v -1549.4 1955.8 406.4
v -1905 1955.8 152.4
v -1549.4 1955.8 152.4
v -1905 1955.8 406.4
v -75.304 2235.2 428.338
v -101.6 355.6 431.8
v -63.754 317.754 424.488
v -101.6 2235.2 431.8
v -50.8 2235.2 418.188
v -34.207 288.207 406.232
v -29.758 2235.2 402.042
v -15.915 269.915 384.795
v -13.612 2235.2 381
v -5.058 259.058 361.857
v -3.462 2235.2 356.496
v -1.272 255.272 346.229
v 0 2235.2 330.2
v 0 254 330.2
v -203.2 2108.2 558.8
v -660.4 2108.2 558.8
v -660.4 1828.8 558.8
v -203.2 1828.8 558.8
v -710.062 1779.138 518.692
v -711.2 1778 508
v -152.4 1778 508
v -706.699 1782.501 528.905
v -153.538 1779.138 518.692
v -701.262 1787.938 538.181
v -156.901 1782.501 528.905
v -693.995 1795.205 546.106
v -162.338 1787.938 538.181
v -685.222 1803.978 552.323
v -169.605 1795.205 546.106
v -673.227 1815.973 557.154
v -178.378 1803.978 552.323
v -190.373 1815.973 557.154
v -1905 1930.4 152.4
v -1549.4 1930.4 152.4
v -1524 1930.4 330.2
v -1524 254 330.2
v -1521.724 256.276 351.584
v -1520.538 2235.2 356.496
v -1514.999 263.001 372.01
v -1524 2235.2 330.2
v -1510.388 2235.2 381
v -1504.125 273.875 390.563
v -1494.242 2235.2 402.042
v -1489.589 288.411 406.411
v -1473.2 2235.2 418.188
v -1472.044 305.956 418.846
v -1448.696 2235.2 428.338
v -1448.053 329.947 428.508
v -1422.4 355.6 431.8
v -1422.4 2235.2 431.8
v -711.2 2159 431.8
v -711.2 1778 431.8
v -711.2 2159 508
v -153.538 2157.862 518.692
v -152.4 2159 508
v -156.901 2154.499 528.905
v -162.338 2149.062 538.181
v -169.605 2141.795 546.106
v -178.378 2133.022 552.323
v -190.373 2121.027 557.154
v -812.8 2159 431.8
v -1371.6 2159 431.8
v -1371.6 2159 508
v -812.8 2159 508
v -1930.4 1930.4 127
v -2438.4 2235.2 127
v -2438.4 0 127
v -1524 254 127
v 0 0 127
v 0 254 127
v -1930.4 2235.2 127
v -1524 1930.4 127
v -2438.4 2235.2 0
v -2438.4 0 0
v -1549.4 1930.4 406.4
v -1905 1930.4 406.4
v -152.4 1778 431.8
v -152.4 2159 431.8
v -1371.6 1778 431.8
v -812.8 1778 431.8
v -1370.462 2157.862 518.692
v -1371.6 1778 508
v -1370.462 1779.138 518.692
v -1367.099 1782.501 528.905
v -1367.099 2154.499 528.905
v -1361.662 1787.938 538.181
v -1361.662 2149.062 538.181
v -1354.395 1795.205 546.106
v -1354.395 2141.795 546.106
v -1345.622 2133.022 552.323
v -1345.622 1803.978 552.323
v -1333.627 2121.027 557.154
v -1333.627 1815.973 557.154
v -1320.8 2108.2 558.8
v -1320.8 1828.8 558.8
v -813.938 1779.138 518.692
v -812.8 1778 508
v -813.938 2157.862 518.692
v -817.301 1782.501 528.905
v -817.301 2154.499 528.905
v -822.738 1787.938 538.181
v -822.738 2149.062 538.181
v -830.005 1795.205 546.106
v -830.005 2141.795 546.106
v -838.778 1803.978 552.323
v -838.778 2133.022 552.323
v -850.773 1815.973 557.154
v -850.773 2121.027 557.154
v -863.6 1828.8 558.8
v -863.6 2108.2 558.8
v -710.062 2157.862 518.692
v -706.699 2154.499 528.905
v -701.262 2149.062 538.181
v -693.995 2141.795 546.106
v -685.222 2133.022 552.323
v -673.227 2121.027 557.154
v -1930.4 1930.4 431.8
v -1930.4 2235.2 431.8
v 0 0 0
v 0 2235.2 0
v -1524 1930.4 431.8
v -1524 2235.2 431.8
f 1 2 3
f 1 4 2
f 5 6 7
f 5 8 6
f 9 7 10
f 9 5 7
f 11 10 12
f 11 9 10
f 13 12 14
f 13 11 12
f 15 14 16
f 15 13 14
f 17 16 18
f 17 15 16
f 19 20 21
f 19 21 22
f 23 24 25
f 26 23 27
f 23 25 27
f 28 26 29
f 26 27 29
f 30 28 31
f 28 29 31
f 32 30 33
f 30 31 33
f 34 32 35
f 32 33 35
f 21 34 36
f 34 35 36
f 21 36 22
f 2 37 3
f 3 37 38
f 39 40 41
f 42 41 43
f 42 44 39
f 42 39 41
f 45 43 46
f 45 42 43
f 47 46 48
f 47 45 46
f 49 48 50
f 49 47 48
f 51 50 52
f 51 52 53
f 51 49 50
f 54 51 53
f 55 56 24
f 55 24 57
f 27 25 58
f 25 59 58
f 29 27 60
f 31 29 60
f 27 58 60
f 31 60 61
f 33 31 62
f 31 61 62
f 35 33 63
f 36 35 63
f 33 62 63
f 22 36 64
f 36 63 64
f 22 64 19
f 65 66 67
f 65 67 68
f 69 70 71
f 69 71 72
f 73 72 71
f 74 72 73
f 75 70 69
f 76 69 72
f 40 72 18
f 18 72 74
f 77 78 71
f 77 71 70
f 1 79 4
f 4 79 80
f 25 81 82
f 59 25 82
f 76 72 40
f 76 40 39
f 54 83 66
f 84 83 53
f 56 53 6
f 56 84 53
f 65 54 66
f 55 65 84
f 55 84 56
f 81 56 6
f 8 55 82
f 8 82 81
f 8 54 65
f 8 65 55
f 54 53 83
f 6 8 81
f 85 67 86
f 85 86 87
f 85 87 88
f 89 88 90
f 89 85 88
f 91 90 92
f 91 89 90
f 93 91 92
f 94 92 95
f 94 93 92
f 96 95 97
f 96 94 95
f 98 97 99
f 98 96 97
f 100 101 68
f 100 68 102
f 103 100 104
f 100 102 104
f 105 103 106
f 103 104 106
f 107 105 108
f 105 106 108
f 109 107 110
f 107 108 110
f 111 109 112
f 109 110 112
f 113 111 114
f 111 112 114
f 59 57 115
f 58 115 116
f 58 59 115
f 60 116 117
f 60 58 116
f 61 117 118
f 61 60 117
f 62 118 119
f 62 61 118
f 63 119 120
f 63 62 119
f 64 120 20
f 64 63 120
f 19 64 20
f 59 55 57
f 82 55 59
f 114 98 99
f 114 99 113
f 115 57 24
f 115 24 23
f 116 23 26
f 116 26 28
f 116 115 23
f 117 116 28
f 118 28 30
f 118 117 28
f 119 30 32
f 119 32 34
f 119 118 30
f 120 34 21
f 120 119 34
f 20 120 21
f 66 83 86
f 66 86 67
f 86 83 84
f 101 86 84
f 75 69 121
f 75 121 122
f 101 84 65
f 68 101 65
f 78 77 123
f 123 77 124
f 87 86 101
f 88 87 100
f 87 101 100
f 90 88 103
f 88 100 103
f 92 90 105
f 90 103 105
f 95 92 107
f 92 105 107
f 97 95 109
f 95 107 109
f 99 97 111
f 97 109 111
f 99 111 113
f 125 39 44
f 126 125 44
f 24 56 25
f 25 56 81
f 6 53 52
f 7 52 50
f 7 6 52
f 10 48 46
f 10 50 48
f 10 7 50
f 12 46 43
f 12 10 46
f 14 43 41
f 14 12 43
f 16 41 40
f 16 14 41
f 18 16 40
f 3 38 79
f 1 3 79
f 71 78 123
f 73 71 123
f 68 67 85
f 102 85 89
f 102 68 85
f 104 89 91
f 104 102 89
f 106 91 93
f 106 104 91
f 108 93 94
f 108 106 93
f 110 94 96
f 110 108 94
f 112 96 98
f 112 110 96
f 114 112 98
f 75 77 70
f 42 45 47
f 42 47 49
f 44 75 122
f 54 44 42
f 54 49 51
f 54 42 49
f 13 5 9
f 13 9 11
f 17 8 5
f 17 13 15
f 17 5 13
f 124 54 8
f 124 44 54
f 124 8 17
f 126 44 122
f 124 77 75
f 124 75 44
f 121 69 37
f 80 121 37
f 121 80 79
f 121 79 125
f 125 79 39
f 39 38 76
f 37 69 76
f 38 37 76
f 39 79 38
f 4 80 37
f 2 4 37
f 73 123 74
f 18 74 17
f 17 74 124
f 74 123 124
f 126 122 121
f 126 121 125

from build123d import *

# Parameters (mm, degrees)
F0_W      = 2438.4
F0_H      = 2235.2
F1_DEPTH  = 127
F2_W      = 1524
F2_H      = 1981.2
F3_DEPTH  = 304.8
F4_R      = 101.6
F5_W      = 558.8
F5_H      = 381
F6_DEPTH  = 127
F7_R      = 50.8
F8_W      = 406.4
F8_H      = 304.8
F9_DEPTH  = 304.8
F11_DEPTH = 25.4


with BuildPart() as f1:
    # F0 (on Top) → F1 (new body)
    with BuildSketch(Plane.XY):
        with Locations((-1219.2, 1117.6)):
            Rectangle(F0_W, F0_H)
    extrude(amount=F1_DEPTH)

    # F2 (on face) → F3 (join)
    with BuildSketch(Plane.XY.offset(127)):
        with Locations((-762, 1244.6)):
            Rectangle(F2_W, F2_H)
    extrude(amount=F3_DEPTH)

    # F4
    f4_edges = [f1.edges().sort_by_distance(p)[0] for p in [
        (-1524, 1244.6, 431.8),
        (-762, 254, 431.8),
        (0, 1244.6, 431.8),
    ]]
    fillet(f4_edges, radius=F4_R)

    # F5 (on face) → F6 (join)
    with BuildSketch(Plane.XY.offset(431.8)):
        with Locations((-431.8, 1968.5)):
            Rectangle(F5_W, F5_H)
        with Locations((-1092.2, 1968.5)):
            Rectangle(F5_W, F5_H)
    extrude(amount=F6_DEPTH)

    # F7
    f7_edges = [f1.edges().sort_by_distance(p)[0] for p in [
        (-1092.2, 2159, 558.8),
        (-1371.6, 1968.5, 558.8),
        (-1092.2, 1778, 558.8),
        (-812.8, 1968.5, 558.8),
        (-431.8, 2159, 558.8),
        (-711.2, 1968.5, 558.8),
        (-431.8, 1778, 558.8),
        (-152.4, 1968.5, 558.8),
    ]]
    fillet(f7_edges, radius=F7_R)

    # F8 (on face) → F9 (join)
    with BuildSketch(Plane.XY.offset(127)):
        with Locations((-1727.2, 2082.8)):
            Rectangle(F8_W, F8_H)
    extrude(amount=F9_DEPTH)

    # F10 (on face) → F11 (cut)
    with BuildSketch(Plane.XZ.offset(-1930.4)):
        Polygon((-1905, 152.4), (-1549.4, 152.4), (-1549.4, 355.6), (-1549.4, 406.4), (-1905, 406.4), align=None)
    extrude(amount=-F11_DEPTH, mode=Mode.SUBTRACT)


solid = f1.part
